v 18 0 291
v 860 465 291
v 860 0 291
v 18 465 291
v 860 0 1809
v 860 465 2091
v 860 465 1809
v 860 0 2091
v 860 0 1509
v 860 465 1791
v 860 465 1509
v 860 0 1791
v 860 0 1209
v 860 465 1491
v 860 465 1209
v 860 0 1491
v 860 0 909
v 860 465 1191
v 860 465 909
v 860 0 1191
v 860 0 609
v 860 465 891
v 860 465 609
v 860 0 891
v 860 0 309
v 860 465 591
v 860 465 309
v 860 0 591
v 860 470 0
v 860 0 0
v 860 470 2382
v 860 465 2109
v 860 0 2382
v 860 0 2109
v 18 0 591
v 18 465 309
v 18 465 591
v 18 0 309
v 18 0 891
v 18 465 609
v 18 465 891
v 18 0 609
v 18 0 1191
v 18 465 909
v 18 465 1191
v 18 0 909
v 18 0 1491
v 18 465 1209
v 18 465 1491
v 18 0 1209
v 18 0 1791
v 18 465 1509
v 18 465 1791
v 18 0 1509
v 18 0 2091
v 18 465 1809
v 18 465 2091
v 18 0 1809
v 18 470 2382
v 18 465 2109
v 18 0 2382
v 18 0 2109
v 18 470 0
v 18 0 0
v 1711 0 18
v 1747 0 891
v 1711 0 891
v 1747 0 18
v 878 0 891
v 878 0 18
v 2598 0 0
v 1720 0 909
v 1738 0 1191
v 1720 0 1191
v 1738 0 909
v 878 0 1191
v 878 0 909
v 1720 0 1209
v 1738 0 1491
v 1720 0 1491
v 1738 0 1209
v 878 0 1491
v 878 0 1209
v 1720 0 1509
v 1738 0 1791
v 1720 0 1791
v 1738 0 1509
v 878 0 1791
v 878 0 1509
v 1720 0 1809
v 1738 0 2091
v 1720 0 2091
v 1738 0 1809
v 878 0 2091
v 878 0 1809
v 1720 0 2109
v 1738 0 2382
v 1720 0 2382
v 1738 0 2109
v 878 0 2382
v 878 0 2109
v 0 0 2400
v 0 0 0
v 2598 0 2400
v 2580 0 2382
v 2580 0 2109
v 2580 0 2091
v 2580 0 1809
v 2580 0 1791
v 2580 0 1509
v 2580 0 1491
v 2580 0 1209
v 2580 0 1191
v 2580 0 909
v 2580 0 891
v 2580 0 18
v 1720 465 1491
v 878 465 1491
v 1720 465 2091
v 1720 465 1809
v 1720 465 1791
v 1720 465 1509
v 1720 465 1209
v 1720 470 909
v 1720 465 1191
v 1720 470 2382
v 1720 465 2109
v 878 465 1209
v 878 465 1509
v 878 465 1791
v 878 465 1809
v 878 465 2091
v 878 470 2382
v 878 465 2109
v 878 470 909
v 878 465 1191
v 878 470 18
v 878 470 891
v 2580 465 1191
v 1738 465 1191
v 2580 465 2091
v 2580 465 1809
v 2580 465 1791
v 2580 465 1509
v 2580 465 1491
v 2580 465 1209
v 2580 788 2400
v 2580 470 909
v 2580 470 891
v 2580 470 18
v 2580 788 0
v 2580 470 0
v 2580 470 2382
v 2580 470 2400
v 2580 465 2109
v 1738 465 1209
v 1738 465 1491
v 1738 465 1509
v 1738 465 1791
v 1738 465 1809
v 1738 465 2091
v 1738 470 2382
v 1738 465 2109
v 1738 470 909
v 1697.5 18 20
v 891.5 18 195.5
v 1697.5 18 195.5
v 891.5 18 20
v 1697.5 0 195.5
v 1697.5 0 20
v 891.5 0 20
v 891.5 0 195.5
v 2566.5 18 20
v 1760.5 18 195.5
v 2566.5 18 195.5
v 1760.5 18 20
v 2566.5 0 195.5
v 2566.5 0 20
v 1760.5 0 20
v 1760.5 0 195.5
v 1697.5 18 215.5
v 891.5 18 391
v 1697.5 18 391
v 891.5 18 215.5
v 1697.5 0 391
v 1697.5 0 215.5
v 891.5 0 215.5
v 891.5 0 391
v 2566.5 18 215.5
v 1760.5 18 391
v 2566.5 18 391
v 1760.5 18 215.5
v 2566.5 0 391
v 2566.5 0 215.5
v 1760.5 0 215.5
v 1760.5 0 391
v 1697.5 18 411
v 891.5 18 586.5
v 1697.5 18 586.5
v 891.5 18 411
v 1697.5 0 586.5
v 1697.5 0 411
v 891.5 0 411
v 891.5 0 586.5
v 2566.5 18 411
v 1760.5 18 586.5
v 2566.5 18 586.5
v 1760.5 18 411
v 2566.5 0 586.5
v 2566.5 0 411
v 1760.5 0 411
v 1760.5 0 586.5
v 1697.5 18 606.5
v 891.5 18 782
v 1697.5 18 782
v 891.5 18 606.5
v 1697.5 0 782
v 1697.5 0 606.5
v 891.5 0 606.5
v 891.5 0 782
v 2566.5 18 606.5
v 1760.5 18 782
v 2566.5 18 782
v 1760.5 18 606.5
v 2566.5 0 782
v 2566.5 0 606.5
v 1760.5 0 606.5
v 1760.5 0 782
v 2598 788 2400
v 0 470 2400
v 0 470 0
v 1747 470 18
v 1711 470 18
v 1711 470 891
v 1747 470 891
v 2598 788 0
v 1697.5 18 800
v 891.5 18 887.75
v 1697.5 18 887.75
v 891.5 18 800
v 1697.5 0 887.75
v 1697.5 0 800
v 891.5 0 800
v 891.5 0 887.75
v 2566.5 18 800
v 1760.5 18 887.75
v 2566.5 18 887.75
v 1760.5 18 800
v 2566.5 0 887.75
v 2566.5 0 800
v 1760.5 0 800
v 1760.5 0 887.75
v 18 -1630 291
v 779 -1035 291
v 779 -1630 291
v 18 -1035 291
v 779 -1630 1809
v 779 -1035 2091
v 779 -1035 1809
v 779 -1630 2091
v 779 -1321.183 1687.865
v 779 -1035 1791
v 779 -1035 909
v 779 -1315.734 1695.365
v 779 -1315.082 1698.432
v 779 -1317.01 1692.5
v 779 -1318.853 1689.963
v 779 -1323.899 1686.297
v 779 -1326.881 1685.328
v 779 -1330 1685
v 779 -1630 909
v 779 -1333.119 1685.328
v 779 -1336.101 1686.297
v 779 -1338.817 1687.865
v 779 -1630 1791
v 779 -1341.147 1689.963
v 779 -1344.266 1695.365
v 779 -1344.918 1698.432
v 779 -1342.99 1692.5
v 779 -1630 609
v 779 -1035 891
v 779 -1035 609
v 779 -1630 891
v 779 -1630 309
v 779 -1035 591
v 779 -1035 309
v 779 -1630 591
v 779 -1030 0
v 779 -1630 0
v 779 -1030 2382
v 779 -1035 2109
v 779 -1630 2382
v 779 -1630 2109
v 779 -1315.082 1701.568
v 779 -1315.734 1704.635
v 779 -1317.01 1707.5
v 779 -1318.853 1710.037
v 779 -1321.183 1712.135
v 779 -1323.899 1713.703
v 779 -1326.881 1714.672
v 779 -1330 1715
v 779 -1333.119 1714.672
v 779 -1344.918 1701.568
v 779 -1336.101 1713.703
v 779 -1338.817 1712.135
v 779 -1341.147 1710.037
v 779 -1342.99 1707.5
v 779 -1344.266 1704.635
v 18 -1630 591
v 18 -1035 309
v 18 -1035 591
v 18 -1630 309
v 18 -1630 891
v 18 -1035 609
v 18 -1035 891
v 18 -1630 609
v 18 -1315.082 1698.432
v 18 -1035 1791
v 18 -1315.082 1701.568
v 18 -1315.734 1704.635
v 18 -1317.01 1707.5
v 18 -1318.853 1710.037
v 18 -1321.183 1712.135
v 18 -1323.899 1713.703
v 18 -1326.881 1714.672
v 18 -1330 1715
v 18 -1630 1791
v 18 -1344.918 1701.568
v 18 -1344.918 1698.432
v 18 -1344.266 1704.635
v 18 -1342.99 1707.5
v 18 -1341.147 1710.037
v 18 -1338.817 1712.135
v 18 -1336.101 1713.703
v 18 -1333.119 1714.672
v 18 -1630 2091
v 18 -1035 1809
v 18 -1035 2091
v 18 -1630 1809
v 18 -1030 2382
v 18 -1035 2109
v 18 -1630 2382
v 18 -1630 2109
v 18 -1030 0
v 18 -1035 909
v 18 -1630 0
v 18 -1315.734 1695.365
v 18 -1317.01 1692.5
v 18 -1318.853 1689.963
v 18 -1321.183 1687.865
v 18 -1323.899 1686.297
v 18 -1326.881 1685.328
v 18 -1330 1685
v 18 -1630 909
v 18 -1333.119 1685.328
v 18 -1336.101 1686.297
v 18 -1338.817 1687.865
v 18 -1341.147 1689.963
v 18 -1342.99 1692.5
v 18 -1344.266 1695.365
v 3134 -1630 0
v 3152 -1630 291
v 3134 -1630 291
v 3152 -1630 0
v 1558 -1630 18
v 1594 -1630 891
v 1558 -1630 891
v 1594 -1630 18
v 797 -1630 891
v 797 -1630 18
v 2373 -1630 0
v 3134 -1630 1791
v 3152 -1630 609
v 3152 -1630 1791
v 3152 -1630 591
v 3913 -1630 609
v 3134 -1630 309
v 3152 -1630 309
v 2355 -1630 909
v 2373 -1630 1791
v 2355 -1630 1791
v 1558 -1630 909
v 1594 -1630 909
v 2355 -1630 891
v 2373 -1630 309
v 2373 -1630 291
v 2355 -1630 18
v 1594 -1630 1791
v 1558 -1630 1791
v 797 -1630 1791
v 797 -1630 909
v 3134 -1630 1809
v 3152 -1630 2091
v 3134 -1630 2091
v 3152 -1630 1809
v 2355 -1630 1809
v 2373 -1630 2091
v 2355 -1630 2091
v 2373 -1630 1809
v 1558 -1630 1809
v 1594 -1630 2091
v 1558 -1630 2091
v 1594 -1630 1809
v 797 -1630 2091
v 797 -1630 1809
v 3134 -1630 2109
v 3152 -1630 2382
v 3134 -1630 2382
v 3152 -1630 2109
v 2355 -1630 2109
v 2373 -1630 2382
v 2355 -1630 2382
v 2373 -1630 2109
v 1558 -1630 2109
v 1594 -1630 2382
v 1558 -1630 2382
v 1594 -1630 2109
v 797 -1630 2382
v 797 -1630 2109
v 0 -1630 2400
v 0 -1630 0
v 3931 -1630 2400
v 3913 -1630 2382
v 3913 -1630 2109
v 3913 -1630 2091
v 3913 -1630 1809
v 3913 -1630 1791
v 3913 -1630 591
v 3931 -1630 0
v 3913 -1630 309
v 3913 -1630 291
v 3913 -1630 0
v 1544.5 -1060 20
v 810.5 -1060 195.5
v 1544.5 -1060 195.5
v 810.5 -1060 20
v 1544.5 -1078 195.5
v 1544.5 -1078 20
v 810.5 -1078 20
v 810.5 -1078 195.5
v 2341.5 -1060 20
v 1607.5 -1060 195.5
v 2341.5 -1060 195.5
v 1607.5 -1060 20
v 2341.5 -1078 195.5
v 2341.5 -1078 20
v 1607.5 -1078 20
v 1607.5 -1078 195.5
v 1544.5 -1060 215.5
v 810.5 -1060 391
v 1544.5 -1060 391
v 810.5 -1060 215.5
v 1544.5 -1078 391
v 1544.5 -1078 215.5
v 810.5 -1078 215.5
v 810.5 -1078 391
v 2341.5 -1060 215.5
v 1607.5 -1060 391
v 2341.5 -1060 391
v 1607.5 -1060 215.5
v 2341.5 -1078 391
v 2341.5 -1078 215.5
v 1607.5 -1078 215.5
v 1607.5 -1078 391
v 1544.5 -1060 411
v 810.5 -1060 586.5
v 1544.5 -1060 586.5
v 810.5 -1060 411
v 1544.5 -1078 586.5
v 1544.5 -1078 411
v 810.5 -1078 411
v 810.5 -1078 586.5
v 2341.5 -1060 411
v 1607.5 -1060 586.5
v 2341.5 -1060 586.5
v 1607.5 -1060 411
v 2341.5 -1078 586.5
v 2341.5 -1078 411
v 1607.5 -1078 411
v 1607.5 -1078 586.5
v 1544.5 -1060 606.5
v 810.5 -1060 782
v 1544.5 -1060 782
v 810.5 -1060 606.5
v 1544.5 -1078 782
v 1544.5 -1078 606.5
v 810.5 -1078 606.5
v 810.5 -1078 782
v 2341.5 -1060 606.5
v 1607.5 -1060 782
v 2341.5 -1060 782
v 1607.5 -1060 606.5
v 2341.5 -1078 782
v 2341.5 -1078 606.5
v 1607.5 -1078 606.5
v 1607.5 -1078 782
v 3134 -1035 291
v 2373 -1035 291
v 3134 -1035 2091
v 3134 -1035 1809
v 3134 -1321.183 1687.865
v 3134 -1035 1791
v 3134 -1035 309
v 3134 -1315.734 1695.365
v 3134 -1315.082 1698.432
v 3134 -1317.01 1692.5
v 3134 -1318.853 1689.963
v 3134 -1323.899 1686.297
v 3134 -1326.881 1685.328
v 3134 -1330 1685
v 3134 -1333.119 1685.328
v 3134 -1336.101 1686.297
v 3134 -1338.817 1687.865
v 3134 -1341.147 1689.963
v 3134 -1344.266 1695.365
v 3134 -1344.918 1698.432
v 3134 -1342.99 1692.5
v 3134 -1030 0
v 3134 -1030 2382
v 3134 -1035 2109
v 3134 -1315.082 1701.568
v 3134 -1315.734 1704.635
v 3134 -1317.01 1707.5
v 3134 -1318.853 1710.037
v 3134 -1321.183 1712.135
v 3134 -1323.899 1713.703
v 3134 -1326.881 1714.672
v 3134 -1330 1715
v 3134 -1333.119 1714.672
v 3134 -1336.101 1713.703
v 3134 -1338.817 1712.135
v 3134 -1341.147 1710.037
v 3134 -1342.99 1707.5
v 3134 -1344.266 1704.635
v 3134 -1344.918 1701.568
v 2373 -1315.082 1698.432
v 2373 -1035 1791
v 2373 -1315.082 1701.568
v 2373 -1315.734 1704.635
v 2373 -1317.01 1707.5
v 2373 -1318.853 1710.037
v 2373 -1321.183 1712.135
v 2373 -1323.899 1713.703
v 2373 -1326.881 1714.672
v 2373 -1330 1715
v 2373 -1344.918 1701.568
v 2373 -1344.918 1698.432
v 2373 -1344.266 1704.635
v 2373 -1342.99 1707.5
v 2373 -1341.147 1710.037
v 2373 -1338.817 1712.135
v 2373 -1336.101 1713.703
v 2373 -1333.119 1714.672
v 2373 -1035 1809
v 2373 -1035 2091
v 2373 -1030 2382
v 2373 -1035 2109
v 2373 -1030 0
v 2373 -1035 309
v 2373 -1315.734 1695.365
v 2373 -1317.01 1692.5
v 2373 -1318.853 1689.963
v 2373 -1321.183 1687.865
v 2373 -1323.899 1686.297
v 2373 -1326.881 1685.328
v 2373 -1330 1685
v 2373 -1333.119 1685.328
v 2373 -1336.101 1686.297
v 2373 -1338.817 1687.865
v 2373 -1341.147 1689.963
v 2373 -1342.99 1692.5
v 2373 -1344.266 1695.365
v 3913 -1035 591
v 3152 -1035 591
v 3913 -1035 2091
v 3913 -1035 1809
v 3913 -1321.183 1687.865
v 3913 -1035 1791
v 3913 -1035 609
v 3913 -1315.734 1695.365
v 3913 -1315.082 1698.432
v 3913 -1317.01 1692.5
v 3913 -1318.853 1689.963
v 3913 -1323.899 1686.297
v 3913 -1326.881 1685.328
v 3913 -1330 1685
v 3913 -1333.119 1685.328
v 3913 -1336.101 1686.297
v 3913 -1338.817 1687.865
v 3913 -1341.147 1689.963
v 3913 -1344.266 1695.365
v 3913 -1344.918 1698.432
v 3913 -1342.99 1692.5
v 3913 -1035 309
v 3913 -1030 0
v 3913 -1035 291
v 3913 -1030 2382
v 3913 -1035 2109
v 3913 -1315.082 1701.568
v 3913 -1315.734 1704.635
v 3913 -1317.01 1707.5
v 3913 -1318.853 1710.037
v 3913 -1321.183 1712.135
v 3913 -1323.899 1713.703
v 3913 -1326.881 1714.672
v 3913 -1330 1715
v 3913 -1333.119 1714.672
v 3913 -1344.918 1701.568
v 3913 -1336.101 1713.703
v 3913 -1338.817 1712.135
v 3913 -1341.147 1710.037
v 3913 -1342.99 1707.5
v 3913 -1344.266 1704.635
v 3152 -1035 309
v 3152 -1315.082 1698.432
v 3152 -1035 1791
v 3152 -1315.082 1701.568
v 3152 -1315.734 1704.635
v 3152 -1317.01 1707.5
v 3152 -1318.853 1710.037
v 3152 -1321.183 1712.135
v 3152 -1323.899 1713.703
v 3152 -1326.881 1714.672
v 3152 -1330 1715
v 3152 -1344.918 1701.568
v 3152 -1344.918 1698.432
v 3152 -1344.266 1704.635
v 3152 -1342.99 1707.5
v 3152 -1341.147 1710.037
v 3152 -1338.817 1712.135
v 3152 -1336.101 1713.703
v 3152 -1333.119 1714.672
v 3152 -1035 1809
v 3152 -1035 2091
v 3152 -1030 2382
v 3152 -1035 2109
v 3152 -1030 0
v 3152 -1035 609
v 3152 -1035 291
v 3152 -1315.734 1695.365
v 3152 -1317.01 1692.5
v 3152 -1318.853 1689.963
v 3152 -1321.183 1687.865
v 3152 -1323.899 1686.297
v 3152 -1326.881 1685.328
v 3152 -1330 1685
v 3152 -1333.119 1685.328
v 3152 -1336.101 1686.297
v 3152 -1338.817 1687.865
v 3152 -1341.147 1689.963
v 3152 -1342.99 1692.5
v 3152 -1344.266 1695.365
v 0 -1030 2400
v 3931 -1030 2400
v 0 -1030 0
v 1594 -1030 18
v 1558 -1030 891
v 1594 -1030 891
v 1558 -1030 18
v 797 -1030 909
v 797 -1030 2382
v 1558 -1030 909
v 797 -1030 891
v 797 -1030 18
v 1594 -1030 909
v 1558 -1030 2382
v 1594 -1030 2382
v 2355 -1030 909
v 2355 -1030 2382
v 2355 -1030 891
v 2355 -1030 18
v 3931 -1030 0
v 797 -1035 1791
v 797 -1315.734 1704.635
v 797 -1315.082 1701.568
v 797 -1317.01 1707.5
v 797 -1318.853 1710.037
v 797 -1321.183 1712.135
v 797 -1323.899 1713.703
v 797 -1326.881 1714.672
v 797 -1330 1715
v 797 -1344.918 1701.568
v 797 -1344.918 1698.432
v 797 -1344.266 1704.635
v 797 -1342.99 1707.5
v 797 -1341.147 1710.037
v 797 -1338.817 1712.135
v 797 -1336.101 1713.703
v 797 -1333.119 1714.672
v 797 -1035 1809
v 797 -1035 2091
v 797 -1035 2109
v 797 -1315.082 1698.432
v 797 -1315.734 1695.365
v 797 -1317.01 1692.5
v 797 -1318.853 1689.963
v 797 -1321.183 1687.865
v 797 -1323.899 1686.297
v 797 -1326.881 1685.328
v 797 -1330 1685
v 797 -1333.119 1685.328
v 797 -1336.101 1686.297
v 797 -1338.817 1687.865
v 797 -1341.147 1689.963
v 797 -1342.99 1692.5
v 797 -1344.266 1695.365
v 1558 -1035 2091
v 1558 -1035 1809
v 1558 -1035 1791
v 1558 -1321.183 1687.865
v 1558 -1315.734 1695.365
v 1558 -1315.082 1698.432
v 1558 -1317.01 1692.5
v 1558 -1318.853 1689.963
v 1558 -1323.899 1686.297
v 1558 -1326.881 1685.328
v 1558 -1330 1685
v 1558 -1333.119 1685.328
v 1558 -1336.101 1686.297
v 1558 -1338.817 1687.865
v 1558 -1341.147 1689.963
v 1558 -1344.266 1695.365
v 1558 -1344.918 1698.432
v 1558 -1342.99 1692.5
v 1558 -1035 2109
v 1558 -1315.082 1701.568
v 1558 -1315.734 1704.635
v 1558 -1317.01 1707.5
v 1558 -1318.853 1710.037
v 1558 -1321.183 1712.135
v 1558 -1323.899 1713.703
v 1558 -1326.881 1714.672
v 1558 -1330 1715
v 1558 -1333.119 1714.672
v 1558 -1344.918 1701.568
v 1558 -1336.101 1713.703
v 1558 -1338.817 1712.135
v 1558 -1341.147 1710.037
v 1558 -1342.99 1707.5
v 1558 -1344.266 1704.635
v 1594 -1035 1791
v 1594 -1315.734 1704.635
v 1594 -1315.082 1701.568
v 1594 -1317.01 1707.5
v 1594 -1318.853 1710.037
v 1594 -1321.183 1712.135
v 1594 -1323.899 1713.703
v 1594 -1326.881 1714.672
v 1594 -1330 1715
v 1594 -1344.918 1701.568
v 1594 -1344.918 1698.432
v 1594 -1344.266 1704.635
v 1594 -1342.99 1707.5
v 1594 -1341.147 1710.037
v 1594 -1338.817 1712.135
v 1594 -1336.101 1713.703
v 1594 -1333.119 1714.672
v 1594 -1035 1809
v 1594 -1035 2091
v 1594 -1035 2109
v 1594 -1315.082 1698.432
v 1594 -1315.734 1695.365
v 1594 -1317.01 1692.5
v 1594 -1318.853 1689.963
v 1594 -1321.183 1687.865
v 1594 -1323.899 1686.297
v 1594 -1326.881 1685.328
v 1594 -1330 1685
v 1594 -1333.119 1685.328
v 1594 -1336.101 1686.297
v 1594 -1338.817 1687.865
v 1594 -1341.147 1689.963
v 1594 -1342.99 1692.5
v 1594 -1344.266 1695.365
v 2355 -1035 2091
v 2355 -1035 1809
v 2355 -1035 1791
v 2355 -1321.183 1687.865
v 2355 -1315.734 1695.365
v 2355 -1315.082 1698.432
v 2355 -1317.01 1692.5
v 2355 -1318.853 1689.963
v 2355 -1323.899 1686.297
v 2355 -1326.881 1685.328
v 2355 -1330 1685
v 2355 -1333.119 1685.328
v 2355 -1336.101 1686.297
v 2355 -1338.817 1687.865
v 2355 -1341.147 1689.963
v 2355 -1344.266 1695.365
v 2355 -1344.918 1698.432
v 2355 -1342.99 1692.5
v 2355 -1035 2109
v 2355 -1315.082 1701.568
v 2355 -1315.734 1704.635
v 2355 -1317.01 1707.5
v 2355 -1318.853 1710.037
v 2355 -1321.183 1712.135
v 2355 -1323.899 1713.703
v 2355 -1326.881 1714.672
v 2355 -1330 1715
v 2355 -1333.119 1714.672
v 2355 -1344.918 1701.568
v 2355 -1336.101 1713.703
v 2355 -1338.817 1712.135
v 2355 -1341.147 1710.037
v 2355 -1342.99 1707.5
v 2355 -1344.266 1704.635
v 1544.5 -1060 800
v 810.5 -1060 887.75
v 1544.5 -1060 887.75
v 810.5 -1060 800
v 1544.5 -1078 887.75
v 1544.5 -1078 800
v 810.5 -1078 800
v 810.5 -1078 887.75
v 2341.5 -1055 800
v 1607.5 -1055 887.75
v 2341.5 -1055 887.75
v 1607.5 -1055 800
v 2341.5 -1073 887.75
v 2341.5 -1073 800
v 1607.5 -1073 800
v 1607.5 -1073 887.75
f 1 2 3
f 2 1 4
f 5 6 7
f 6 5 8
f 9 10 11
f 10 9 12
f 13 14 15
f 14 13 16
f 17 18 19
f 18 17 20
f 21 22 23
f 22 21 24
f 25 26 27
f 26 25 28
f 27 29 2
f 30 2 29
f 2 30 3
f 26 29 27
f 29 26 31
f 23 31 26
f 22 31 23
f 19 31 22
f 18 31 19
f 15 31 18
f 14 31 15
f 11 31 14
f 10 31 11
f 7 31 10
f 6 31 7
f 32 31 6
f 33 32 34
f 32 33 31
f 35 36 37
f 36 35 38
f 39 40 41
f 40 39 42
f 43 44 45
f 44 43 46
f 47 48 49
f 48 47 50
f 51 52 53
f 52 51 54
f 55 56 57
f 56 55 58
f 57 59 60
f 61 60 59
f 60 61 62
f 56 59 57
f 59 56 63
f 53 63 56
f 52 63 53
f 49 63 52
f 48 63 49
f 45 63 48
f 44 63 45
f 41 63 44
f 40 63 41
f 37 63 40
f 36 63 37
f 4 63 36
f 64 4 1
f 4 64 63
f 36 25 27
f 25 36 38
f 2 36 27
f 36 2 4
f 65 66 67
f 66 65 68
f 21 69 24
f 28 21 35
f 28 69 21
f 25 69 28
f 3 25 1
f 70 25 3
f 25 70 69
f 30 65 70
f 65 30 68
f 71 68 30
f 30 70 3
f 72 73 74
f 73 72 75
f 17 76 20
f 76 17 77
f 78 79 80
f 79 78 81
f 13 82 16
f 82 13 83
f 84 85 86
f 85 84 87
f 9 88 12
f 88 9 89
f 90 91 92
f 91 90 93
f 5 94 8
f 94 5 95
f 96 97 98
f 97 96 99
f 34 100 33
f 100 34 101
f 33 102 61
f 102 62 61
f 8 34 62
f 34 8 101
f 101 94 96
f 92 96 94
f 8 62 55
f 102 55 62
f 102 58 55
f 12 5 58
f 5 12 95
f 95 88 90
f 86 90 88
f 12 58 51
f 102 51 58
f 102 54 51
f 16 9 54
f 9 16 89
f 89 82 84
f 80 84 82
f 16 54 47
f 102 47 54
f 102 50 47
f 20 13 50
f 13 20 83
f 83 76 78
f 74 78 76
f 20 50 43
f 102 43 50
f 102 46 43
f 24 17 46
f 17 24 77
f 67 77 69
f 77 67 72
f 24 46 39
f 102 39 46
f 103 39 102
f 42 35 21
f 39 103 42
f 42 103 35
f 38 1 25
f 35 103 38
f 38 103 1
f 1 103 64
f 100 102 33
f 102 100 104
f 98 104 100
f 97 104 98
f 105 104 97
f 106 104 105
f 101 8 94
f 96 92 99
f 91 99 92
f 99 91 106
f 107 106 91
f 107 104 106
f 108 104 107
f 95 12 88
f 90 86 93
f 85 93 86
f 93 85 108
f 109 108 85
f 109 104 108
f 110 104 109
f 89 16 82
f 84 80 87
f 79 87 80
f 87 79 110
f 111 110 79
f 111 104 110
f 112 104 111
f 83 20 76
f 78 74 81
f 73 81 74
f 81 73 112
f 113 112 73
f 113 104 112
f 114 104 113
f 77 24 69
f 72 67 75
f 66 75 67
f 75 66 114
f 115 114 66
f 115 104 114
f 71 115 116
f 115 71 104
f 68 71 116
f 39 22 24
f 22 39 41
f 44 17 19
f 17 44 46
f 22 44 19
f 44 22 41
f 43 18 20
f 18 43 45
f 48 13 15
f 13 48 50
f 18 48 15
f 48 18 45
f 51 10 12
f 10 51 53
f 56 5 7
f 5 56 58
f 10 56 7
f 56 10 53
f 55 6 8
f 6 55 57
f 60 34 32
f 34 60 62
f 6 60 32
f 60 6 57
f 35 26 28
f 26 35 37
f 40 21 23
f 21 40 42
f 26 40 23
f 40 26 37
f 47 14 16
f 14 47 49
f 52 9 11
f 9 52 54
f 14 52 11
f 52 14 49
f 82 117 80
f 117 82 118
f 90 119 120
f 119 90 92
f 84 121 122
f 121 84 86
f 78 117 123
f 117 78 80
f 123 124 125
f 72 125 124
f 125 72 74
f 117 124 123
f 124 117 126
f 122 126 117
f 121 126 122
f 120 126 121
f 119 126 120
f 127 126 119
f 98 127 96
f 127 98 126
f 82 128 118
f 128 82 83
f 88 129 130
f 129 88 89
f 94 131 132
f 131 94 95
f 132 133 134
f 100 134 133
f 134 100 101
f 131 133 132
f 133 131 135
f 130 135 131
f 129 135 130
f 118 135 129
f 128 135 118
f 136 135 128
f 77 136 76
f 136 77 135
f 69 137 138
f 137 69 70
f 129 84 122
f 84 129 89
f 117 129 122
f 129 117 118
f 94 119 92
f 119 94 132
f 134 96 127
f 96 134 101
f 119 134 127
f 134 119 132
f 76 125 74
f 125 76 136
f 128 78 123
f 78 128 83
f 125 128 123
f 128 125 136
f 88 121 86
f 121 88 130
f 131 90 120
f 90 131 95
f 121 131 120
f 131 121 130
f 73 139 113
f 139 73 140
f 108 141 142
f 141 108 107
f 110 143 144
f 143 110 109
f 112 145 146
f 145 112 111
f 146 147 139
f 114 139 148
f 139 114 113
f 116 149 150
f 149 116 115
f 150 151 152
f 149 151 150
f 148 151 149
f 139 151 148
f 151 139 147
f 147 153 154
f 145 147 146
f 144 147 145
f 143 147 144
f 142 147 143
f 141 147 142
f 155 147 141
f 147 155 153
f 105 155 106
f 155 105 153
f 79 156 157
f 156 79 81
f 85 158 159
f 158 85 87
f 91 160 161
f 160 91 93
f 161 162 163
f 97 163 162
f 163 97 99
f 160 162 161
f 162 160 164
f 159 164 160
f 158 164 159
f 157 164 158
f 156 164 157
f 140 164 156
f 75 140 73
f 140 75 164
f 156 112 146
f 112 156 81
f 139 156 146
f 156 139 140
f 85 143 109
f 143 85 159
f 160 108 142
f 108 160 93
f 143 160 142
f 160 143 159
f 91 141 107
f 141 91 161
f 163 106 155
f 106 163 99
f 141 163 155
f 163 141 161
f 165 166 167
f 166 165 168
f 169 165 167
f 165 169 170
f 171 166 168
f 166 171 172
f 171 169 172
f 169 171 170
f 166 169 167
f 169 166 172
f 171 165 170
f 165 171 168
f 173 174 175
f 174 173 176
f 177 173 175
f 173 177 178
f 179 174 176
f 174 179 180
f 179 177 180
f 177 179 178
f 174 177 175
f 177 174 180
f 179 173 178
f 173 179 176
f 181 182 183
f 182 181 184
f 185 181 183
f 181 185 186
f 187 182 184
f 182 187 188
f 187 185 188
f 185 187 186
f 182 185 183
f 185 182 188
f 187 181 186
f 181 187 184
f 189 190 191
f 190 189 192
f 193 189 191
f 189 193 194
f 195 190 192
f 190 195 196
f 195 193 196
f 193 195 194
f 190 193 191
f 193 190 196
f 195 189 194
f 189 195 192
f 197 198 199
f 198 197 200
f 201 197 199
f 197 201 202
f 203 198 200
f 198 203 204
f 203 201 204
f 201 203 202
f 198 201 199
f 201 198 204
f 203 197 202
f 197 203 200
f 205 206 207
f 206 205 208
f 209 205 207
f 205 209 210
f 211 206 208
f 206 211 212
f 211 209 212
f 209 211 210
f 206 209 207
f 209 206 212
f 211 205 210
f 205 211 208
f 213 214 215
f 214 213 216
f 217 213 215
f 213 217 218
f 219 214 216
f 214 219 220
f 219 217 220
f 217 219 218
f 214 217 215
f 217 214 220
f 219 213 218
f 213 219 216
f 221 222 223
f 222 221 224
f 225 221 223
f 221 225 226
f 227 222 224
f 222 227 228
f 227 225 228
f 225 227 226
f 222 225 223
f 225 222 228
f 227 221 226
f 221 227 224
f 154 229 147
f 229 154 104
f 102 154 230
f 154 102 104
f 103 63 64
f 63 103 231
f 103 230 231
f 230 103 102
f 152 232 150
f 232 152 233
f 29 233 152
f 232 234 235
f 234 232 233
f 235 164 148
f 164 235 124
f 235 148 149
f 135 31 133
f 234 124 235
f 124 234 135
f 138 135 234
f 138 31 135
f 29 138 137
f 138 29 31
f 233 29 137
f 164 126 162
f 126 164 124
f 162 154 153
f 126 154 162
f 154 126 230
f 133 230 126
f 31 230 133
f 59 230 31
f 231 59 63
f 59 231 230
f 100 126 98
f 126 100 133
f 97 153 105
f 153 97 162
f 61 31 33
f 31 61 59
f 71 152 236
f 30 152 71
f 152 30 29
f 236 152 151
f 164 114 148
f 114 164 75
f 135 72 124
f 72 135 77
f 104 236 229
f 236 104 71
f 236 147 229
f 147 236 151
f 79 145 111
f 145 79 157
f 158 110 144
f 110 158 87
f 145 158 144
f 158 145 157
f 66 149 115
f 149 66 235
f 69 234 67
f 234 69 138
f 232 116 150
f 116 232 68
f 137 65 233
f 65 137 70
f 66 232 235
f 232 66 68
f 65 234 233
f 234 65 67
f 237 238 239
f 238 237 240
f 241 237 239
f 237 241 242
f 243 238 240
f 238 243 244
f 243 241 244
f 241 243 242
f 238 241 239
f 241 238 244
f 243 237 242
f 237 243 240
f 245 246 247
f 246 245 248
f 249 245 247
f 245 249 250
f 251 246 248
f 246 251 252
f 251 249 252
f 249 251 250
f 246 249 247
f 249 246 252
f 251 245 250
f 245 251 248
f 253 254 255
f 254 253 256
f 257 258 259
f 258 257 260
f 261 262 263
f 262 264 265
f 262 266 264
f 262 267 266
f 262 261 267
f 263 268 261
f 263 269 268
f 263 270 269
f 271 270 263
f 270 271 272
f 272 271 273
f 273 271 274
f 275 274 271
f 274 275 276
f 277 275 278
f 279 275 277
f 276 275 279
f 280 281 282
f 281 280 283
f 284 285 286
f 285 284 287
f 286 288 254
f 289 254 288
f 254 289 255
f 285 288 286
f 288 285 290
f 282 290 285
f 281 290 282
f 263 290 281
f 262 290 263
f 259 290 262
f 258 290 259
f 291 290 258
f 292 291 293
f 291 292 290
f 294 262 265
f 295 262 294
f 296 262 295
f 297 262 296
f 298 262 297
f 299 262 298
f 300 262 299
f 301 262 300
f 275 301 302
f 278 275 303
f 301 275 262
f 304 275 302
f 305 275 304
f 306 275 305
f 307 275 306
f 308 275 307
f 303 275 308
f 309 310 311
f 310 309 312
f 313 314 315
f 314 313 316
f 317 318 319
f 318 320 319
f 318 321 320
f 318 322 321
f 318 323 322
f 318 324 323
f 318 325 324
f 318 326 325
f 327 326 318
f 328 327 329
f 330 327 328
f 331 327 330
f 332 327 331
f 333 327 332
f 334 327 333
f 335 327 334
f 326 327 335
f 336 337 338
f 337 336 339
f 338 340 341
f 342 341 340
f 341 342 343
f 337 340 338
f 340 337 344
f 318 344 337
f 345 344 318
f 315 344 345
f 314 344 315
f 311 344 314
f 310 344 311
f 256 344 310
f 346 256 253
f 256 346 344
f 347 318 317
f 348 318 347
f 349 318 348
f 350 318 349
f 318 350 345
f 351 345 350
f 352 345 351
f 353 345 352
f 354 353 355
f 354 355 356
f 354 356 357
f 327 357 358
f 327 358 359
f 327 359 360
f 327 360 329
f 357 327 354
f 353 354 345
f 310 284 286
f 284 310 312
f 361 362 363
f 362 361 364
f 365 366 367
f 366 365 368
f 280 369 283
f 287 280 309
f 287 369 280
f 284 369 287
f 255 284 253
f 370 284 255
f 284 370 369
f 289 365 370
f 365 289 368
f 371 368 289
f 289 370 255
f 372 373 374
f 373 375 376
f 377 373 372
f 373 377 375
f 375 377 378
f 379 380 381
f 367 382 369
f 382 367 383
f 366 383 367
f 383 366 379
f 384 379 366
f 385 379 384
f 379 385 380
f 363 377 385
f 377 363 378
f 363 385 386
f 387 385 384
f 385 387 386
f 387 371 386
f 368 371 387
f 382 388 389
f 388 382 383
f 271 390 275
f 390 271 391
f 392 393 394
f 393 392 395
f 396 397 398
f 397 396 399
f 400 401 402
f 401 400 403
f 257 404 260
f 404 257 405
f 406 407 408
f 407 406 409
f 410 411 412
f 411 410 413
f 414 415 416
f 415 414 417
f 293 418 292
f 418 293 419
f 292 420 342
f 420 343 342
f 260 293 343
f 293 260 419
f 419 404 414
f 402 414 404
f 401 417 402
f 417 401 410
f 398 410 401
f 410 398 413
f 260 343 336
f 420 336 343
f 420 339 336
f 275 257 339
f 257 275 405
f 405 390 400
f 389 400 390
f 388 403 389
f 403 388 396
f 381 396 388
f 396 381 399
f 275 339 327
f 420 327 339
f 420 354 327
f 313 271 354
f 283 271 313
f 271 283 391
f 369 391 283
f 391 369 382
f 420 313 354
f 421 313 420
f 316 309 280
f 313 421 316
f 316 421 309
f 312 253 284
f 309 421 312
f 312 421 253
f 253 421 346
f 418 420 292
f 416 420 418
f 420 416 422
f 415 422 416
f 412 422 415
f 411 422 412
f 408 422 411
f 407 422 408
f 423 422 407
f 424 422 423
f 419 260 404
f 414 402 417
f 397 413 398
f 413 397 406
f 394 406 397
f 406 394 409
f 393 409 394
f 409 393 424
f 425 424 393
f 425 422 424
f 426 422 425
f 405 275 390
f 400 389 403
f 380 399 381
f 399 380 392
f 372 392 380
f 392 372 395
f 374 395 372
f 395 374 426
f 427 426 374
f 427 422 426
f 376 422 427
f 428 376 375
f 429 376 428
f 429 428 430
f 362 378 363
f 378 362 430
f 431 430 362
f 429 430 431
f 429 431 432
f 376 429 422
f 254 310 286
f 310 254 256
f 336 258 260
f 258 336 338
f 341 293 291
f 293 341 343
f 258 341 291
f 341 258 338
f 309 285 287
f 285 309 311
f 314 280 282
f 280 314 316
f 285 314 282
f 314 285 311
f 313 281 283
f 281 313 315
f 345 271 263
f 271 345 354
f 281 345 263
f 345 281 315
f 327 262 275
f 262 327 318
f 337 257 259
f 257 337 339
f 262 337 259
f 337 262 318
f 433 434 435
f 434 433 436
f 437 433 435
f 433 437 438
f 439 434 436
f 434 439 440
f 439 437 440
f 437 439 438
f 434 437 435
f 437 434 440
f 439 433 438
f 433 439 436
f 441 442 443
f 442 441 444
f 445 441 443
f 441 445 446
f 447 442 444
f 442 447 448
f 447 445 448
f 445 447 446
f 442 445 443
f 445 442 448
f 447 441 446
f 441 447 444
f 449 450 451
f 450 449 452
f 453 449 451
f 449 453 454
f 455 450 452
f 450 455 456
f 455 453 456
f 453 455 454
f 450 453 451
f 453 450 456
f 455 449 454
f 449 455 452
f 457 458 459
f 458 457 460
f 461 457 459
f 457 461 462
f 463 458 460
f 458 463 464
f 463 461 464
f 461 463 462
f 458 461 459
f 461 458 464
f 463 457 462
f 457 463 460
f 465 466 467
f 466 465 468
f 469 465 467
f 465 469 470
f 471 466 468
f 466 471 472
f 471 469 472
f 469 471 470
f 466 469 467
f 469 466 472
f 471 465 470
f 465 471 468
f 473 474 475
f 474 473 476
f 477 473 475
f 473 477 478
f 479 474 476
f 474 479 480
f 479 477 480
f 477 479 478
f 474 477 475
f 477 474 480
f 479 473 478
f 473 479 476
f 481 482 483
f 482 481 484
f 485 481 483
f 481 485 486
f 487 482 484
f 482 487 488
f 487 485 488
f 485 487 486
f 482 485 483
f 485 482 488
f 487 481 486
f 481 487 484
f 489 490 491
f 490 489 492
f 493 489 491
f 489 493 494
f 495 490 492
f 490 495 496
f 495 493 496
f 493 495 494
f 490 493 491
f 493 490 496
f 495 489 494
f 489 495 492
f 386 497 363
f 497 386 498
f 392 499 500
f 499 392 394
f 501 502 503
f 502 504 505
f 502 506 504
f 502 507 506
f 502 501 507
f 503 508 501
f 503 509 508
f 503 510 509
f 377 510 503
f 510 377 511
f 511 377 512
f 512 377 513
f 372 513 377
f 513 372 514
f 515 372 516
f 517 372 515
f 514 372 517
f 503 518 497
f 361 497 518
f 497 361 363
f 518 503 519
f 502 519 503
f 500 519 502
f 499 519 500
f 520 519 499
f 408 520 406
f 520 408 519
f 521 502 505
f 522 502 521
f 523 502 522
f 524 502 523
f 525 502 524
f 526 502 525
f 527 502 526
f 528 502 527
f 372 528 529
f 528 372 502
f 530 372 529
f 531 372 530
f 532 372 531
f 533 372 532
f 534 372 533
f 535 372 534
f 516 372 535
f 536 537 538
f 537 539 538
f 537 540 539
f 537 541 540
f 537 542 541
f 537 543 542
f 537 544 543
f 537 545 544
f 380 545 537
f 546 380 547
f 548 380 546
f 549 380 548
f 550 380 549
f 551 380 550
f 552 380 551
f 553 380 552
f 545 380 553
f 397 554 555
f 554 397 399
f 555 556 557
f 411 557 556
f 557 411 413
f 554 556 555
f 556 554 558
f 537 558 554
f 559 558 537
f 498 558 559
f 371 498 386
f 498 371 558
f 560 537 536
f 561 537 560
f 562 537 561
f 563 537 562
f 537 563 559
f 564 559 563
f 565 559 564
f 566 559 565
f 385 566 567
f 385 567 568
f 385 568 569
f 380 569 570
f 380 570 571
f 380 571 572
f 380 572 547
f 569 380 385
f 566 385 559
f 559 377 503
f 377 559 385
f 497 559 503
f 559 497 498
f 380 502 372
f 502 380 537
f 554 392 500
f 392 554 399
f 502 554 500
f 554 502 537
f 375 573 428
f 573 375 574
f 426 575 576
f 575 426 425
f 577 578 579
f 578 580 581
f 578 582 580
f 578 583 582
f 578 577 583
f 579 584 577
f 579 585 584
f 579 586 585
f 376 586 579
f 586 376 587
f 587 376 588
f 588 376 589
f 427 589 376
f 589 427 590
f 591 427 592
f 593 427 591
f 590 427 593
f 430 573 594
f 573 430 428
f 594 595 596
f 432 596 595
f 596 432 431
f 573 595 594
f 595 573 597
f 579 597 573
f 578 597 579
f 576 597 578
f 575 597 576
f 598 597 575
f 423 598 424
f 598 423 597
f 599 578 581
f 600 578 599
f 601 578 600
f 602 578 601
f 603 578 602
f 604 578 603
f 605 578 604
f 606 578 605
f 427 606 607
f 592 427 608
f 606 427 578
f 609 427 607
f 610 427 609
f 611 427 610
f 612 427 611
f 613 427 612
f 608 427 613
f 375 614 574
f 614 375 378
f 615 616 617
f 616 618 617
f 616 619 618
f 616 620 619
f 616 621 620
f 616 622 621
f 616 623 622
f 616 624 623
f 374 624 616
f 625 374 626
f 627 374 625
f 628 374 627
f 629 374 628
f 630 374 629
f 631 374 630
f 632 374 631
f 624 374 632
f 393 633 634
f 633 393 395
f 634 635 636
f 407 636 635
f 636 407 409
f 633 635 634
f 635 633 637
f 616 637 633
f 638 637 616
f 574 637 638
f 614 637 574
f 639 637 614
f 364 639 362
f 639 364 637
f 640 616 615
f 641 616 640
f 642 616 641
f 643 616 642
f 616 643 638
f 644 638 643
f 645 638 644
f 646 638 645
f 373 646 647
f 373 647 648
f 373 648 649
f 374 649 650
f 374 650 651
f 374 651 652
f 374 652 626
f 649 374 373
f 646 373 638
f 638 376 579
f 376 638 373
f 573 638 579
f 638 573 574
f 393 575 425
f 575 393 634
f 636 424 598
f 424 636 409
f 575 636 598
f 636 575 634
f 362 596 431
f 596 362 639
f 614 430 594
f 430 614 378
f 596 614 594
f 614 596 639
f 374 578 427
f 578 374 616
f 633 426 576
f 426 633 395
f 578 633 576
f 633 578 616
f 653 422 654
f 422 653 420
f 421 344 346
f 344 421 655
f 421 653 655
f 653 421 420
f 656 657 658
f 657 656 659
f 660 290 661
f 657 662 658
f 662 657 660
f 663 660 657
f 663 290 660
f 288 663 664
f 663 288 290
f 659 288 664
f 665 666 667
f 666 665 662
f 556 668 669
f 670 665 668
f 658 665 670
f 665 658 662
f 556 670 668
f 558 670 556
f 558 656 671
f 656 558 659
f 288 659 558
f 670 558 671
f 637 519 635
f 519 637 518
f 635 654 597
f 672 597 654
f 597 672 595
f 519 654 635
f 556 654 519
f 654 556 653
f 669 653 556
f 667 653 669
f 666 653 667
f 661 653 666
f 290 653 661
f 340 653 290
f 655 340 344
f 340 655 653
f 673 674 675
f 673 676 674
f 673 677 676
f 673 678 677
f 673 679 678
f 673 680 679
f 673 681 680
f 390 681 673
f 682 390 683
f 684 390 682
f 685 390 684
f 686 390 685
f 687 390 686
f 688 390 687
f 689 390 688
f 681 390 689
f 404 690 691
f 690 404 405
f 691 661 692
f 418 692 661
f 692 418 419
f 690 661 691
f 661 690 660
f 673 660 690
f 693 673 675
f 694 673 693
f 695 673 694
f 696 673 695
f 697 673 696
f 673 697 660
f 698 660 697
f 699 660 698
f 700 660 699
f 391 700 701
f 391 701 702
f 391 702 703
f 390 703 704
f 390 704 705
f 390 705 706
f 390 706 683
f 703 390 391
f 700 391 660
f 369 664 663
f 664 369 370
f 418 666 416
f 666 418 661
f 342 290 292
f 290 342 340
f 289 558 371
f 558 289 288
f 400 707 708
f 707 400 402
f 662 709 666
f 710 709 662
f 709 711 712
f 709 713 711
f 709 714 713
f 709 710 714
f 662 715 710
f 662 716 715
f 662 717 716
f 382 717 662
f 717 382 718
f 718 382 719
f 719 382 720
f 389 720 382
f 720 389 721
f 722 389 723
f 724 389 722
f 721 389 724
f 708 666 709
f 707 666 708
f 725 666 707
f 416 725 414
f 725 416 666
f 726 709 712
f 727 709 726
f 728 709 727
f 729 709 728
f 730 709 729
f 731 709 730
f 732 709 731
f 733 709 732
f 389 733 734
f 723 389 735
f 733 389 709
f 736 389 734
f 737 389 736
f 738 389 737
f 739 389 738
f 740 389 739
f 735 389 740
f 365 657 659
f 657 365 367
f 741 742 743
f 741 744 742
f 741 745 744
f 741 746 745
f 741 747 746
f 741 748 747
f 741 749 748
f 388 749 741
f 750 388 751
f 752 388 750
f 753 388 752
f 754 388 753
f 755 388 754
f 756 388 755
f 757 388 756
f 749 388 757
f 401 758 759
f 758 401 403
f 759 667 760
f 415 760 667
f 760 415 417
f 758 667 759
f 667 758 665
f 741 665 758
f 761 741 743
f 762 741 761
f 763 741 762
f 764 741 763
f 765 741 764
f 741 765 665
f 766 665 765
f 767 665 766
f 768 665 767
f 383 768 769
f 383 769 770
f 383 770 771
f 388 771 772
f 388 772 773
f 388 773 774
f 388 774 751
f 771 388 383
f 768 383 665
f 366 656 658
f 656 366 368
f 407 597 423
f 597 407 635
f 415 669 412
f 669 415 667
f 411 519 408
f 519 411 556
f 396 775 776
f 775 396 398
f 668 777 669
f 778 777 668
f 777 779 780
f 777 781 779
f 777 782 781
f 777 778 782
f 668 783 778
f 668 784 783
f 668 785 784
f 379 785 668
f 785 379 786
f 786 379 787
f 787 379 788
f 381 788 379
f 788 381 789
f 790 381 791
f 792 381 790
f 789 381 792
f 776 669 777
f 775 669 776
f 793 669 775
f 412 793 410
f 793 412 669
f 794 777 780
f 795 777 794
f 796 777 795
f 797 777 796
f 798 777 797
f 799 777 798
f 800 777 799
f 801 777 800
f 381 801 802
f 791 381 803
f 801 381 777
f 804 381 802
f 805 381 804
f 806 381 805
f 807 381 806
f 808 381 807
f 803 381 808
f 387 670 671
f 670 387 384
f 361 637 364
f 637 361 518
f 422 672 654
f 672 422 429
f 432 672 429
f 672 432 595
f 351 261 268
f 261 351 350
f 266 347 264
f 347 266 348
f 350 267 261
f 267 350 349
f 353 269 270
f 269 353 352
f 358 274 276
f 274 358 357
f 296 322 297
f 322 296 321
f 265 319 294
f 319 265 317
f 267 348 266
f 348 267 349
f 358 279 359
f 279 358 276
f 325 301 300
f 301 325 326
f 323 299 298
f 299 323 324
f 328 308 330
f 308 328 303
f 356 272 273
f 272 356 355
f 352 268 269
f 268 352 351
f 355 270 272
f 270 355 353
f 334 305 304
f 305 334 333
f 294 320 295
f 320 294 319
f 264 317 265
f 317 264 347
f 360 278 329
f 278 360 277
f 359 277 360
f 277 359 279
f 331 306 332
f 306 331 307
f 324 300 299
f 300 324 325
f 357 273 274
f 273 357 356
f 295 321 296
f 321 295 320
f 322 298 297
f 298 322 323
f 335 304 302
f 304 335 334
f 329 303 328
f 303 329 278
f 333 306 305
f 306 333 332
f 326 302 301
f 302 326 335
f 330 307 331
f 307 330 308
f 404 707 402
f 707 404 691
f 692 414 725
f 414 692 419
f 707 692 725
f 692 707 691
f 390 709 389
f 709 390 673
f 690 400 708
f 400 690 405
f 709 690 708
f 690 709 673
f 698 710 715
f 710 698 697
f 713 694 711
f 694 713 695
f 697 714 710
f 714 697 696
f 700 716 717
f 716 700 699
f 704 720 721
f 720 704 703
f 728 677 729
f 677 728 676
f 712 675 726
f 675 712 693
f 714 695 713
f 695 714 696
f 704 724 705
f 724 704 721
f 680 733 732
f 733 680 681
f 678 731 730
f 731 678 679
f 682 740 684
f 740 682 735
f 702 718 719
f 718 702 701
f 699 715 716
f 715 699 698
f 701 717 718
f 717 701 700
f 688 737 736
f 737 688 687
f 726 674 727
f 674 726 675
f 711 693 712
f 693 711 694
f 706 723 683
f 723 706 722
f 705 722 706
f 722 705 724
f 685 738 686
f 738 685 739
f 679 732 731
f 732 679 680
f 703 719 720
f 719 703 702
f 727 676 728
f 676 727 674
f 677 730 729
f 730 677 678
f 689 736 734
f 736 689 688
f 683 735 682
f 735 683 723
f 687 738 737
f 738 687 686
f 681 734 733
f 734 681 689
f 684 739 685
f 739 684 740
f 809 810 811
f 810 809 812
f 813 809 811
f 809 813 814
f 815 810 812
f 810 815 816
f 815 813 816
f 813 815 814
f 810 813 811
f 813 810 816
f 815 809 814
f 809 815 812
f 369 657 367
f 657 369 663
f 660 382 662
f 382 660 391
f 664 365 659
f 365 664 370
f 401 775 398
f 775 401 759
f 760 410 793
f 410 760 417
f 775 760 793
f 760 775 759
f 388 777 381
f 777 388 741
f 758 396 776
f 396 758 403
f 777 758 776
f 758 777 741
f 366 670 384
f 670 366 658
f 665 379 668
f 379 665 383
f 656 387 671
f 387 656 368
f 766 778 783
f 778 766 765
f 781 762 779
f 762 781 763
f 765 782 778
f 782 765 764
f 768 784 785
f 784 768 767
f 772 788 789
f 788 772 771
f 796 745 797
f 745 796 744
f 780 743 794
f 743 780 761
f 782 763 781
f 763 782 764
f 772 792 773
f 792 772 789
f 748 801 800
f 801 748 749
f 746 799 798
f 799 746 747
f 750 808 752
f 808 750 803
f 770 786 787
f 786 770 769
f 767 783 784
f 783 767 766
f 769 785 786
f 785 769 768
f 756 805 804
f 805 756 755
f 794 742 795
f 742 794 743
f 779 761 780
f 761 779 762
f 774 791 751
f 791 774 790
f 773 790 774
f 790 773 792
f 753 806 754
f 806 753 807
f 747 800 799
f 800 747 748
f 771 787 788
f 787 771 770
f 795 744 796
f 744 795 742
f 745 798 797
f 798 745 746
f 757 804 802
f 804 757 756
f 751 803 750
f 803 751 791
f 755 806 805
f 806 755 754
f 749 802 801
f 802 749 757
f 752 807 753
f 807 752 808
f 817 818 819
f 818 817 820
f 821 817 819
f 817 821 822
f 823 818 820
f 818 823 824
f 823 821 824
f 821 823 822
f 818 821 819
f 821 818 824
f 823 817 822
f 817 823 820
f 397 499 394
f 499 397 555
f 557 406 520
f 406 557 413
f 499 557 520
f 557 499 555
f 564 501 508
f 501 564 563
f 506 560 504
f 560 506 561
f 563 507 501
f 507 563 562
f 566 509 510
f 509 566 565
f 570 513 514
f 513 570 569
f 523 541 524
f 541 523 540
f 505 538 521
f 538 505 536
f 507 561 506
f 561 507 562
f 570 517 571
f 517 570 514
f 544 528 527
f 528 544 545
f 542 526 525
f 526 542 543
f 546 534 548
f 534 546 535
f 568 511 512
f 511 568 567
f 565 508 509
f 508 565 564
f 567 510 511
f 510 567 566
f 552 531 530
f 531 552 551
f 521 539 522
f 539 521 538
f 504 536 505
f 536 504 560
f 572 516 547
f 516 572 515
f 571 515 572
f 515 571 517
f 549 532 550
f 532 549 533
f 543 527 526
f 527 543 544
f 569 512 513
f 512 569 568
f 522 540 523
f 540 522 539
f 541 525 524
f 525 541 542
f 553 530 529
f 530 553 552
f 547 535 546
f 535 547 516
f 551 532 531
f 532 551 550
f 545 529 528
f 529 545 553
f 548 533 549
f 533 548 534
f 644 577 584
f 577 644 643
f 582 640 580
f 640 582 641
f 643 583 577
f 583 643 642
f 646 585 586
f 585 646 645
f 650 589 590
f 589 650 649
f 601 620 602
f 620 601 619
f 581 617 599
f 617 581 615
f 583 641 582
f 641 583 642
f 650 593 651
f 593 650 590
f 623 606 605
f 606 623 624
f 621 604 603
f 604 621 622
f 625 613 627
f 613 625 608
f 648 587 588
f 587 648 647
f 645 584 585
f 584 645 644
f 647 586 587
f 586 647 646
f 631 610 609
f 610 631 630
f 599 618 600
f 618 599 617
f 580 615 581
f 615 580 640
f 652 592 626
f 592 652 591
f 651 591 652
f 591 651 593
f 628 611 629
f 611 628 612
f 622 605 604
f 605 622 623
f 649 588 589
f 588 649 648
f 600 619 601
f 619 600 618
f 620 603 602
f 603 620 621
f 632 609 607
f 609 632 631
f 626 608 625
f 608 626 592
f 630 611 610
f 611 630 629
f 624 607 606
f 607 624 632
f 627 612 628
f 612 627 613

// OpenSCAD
// kék elem: kivehető
// zöld: fatiplivel és csavarral rögzített
// piros: tartóelem

module lap(szin, sz,m, cimke, v=18){
    echo(cimke, sz,m);
    color(szin)cube([v,m,sz]);
}

lapvastagsag=18;
teljes_m=2400;
csuszkak_szelessege = 27;
fiok_m = (1200 - lapvastagsag*3/2) / 6 - 20; // 20: ennyi hely van az ujjaknak benyúlni

piros = [1,0,0];
zold = [0,1,0];
kek = [0,0,1];
//baloldali_sarok();

baloldali_fiokos();

jobb_oldal();

module baloldali_fiokos(){
    teljes_sz=2580;
    fuggoleges_koz=(teljes_sz-3*lapvastagsag)/3;

    x_elso = 0;
    x_masodik = x_elso + lapvastagsag + fuggoleges_koz;
    x_harmadik = x_masodik + lapvastagsag + fuggoleges_koz;
    x_negyedik = x_harmadik + lapvastagsag + fuggoleges_koz;
    melyseg = 470;
    polc_melyseg = 465;
    fiok_melyseg = 450;


    translate([x_elso, 0, 0])lap(piros,2400,melyseg, "Bal szekrény: 1. oldalfal");
    translate([x_masodik,0,0])lap(piros,2382,melyseg, "Bal szekrény: 2. oldalfal");
    translate([x_harmadik,0,900+lapvastagsag/2])lap(piros,1473,melyseg, "Bal szekrény: fiókok feletti fal.");
    translate([x_negyedik,0,0])lap(piros,2400,788, "Bal szekrény: router melletti oldalfal");
    //leforgattuk ezért a teteje került  a 0-ra
    translate([18,0,teljes_m])rotate([0,90,0])lap(zold, teljes_sz-lapvastagsag, melyseg, "Bal szekrény: teteje");

    for(z = [300,900,1200,1800,2100]){
        translate([lapvastagsag, 0, z+lapvastagsag/2])rotate([0,90,0])lap(kek, fuggoleges_koz, polc_melyseg, "Bal szekrény: első rész polc");
    }
    for(z = [600,1500]){
        translate([lapvastagsag, 0, z+lapvastagsag/2])rotate([0,90,0])lap(zold, fuggoleges_koz, polc_melyseg, "Bal szekrény: első rész polc");
    }

    for(z = [1500,2100]){
        translate([x_masodik + lapvastagsag, 0, z+lapvastagsag/2])rotate([0,90,0])lap(kek, fuggoleges_koz, polc_melyseg, "Bal szekrény: második rész polc");
    }
    for(z = [1200, 1800]){
        translate([x_masodik + lapvastagsag, 0, z+lapvastagsag/2])rotate([0,90,0])lap(zold, fuggoleges_koz, polc_melyseg, "Bal szekrény: második rész polc");
    }

    for(z = [1200, 1800,2100]){
        translate([x_harmadik + lapvastagsag, 0, z+lapvastagsag/2])rotate([0,90,0])lap(kek, fuggoleges_koz, polc_melyseg, "Bal szekrény: harmadik rész polc");
    }

    for(z = [1500]){
        translate([x_harmadik + lapvastagsag, 0, z+lapvastagsag/2])rotate([0,90,0])lap(zold, fuggoleges_koz, polc_melyseg, "Bal szekrény: harmadik rész polc");
    }

    translate([x_masodik+lapvastagsag,0, 900+lapvastagsag/2])rotate([0,90,0])lap(zold, lapvastagsag+2*fuggoleges_koz,melyseg, "Bal szekrény: fiókok feletti lap");
    translate([x_masodik+lapvastagsag,0, lapvastagsag])rotate([0,90,0])lap(zold, lapvastagsag+2*fuggoleges_koz,melyseg, "Bal szekrény: alatti lap");
    translate([x_harmadik+lapvastagsag/2,0, lapvastagsag])lap(piros, 900-1.5*lapvastagsag,melyseg, "Bal szekrény: fiók elválasztó");
    translate([x_harmadik-lapvastagsag/2,0, lapvastagsag])lap(piros, 900-1.5*lapvastagsag,melyseg, "Bal szekrény: fiók elválasztó");

    // Fiók előlapok
    fiok_sz = fuggoleges_koz - csuszkak_szelessege - lapvastagsag/2;
    translate([x_masodik+lapvastagsag+csuszkak_szelessege/2, 0, 800])rotate([90,0,90])lap(kek, fiok_sz, fiok_m/2, "Bal szekrény: sekély fiók");
    translate([x_harmadik+3/2*lapvastagsag+csuszkak_szelessege/2, 0, 800])rotate([90,0,90])lap(kek, fiok_sz, fiok_m/2, "Bal szekrény: sekély fiók");
    for(z = [20:fiok_m+20:700]){
        translate([x_masodik+lapvastagsag+csuszkak_szelessege/2,0,z])rotate([90,0,90])lap(kek, fiok_sz, fiok_m, "Bal szekrény: teljes magasságu fiók");
        translate([x_harmadik+lapvastagsag+csuszkak_szelessege/2+9,0,z])rotate([90,0,90])lap(kek, fiok_sz, fiok_m, "Bal szekrény: teljes magasságu fiók");
    }

    echo("Balszekrény fiók méretek:", "oldal - ", fiok_melyseg, fiok_m, "előlap - ", fiok_sz - 2 * lapvastagsag);
}

module baloldali_sarok(){
    lap(piros, teljes_m, 315+lapvastagsag);
    translate([lapvastagsag,lapvastagsag,0])rotate([0,0,-90])lap(zold, teljes_m, 445);
    translate([445,-melyseg+lapvastagsag,0])rotate([0,0,0])lap(kek, teljes_m, melyseg-lapvastagsag);
}

module jobb_oldal(){
    
    teljes_sz = 3930;
    y_jobb_hatlap = -1630;
    melyseg = 600;
    polc_melyseg = 595;
    fiok_melyseg = 570;
    fuggoleges_koz = round((teljes_sz - 7 * lapvastagsag) / 5);
    echo("Jobb szekrény 1 - függőleges köz:", fuggoleges_koz);
    echo("Jobb szekrény 1 - Teljes szélesség:", 5*fuggoleges_koz+7*lapvastagsag);
    x_elso = 0;
    x_masodik = x_elso + lapvastagsag + fuggoleges_koz;
    x_harmadik = x_masodik + 2 * lapvastagsag + fuggoleges_koz;
    x_negyedik = x_harmadik + lapvastagsag + fuggoleges_koz;
    x_otodik = x_negyedik + lapvastagsag + fuggoleges_koz;
    x_hatodik = x_otodik + lapvastagsag + fuggoleges_koz;
    translate([x_elso, y_jobb_hatlap,0])lap(piros, teljes_m, melyseg, "1. Jobb szekrény : 1. oldalfal");
    translate([x_masodik, y_jobb_hatlap,0])lap(piros, teljes_m - lapvastagsag, melyseg, "1. Jobb szekrény: 2. oldalfal");
    translate([x_harmadik-lapvastagsag, y_jobb_hatlap,0])lap([1,1,0], teljes_m, melyseg, "1. Jobb szekrény: 3. oldalfal");
    translate([x_harmadik, y_jobb_hatlap,0])lap(piros, teljes_m, melyseg, "2. Jobb szekrény: 1. oldalfal");
    translate([x_negyedik, y_jobb_hatlap,0])lap(piros, teljes_m - lapvastagsag, melyseg, "2. Jobb szekrény: 2. oldalfal");
    translate([x_otodik, y_jobb_hatlap,0])lap(piros, teljes_m - lapvastagsag, melyseg, "2. Jobb szekrény: 3. oldalfal");
    translate([x_hatodik, y_jobb_hatlap,0])lap(piros, teljes_m, melyseg, "2. Jobb szekrény: 4. oldalfal");

    translate([x_elso+lapvastagsag, y_jobb_hatlap,teljes_m])rotate([0,90,0])lap(zold,2*fuggoleges_koz+lapvastagsag, 600, "1. Jobb szekrény: teteje");

    for(z = [300, 2100]){
        translate([x_elso+lapvastagsag,y_jobb_hatlap,z+lapvastagsag/2])rotate([0,90,0])lap(zold,fuggoleges_koz, polc_melyseg, "1. Jobb szekrény: 1. fakk polcok");
    }
    for(z = [600, 900, 1800]){
        translate([x_elso+lapvastagsag,y_jobb_hatlap,z+lapvastagsag/2])rotate([0,90,0])lap(kek,fuggoleges_koz, polc_melyseg, "1. Jobb szekrény: 1. fakk polcok");
    }

    translate([x_elso+lapvastagsag,y_jobb_hatlap+300,1700])rotate([0,90,0])cylinder(r=15,h=fuggoleges_koz);
    
    fiok_sz = fuggoleges_koz - csuszkak_szelessege;
    //fiok_m = (800 - lapvastagsag * 3 / 2) / 4 - 20; // 20: ennyi hely van az ujjaknak benyúlni
    for(z = [20:fiok_m+20:700]){
        translate([x_masodik+lapvastagsag+csuszkak_szelessege/2,y_jobb_hatlap + fiok_melyseg - lapvastagsag,z])rotate([90,0,90])lap(kek, fiok_sz, fiok_m, "1. Jobb szekrény: teljes magasságu fiók");
        // 3-as osztásúban lévő fiók
        translate([x_harmadik+lapvastagsag+csuszkak_szelessege/2,y_jobb_hatlap + fiok_melyseg - lapvastagsag,z])rotate([90,0,90])lap(kek, fiok_sz, fiok_m, "2. Jobb szekrény: teljes magasságu fiók");
    }

    for(z = [2100]){
        translate([x_masodik+lapvastagsag,y_jobb_hatlap,z+lapvastagsag/2])rotate([0,90,0])lap(kek,fuggoleges_koz, polc_melyseg, "1. Jobb szekrény: második fakk");
    }
    for(z = [1800]){
        translate([x_masodik+lapvastagsag,y_jobb_hatlap,z+lapvastagsag/2])rotate([0,90,0])lap(zold,fuggoleges_koz, polc_melyseg, "1. Jobb szekrény: második fakk");
    }
    translate([x_masodik+lapvastagsag,y_jobb_hatlap+300,1700])rotate([0,90,0])cylinder(r=15,h=fuggoleges_koz);
    translate([x_masodik+lapvastagsag+csuszkak_szelessege/2,y_jobb_hatlap + fiok_melyseg - lapvastagsag,800])rotate([90,0,90])lap(kek, fiok_sz, fiok_m/2, "1. Jobb szekrény: sekély fiók");
    translate([x_masodik+lapvastagsag,y_jobb_hatlap, 900+lapvastagsag/2])rotate([0,90,0])lap(zold, fuggoleges_koz,600, "1. Jobb szekrény: fiókok feletti lap");
    translate([x_masodik+lapvastagsag,y_jobb_hatlap, lapvastagsag])rotate([0,90,0])lap(zold, fuggoleges_koz,600, "1. Jobb szekrény: fiókok alatti lap");

// 3 osztású rész itt kezdődik. A fiókok együtt mennek a 2 osztású szekrénnyel.

    translate([x_harmadik+lapvastagsag, y_jobb_hatlap,teljes_m])rotate([0,90,0])lap(zold,3*fuggoleges_koz+2*lapvastagsag, 600, "2. Jobb szekrény: teteje");
    for(z = [2100]){
        translate([x_harmadik+lapvastagsag,y_jobb_hatlap,z+lapvastagsag/2])rotate([0,90,0])lap(zold,fuggoleges_koz, 595, "2. jobb szekrény: első fakk polc");
    }
    for(z = [1800]){
        translate([x_harmadik+lapvastagsag,y_jobb_hatlap,z+lapvastagsag/2])rotate([0,90,0])lap(kek,fuggoleges_koz, 595, "2. jobb szekrény: első fakk polc");
    }
    translate([x_harmadik+lapvastagsag,y_jobb_hatlap, 900+lapvastagsag/2])rotate([0,90,0])lap(zold, fuggoleges_koz,600, "2. jobb szekrény: fiókok feletti lap");
    translate([x_harmadik+lapvastagsag,y_jobb_hatlap, lapvastagsag])rotate([0,90,0])lap(zold, fuggoleges_koz,600, "2. jobb szekrény: fiókok alatti lap");
    translate([x_harmadik+lapvastagsag,y_jobb_hatlap+300,1700])rotate([0,90,0])cylinder(r=15,h=fuggoleges_koz);
    translate([x_harmadik+lapvastagsag+csuszkak_szelessege/2,y_jobb_hatlap + 575 - lapvastagsag,800])rotate([90,0,90])lap(kek, fiok_sz, fiok_m/2, "2. jobb szekrény: sekély fiók");

    for(z = [300,1800]){
        translate([x_negyedik+lapvastagsag,y_jobb_hatlap,z+lapvastagsag/2])rotate([0,90,0])lap(zold,fuggoleges_koz, 595, "2. jobb szekrény: második fakk polc");
    }
    for(z = [2100]){
        translate([x_negyedik+lapvastagsag,y_jobb_hatlap,z+lapvastagsag/2])rotate([0,90,0])lap(kek,fuggoleges_koz, 595, "2. jobb szekrény: második fakk polc");
    }
    translate([x_negyedik+lapvastagsag,y_jobb_hatlap+300,1700])rotate([0,90,0])cylinder(r=15,h=fuggoleges_koz);
    
    for(z = [600,2100]){
        translate([x_otodik+lapvastagsag,y_jobb_hatlap,z+lapvastagsag/2])rotate([0,90,0])lap(zold,fuggoleges_koz, 595, "2. jobb szekrény: harmadik fakk polc");
    }
    for(z = [300,1800]){
        translate([x_otodik+lapvastagsag,y_jobb_hatlap,z+lapvastagsag/2])rotate([0,90,0])lap(kek,fuggoleges_koz, 595, "2. jobb szekrény: harmadik fakk polc");
    }
    translate([x_otodik+lapvastagsag,y_jobb_hatlap+300,1700])rotate([0,90,0])cylinder(r=15,h=fuggoleges_koz);
    echo("Mindkét jobb oldali szekrény fiók méretek:", "oldal - ", fiok_melyseg, fiok_m, "előlap - ", fiok_sz - 2 * lapvastagsag);
}
